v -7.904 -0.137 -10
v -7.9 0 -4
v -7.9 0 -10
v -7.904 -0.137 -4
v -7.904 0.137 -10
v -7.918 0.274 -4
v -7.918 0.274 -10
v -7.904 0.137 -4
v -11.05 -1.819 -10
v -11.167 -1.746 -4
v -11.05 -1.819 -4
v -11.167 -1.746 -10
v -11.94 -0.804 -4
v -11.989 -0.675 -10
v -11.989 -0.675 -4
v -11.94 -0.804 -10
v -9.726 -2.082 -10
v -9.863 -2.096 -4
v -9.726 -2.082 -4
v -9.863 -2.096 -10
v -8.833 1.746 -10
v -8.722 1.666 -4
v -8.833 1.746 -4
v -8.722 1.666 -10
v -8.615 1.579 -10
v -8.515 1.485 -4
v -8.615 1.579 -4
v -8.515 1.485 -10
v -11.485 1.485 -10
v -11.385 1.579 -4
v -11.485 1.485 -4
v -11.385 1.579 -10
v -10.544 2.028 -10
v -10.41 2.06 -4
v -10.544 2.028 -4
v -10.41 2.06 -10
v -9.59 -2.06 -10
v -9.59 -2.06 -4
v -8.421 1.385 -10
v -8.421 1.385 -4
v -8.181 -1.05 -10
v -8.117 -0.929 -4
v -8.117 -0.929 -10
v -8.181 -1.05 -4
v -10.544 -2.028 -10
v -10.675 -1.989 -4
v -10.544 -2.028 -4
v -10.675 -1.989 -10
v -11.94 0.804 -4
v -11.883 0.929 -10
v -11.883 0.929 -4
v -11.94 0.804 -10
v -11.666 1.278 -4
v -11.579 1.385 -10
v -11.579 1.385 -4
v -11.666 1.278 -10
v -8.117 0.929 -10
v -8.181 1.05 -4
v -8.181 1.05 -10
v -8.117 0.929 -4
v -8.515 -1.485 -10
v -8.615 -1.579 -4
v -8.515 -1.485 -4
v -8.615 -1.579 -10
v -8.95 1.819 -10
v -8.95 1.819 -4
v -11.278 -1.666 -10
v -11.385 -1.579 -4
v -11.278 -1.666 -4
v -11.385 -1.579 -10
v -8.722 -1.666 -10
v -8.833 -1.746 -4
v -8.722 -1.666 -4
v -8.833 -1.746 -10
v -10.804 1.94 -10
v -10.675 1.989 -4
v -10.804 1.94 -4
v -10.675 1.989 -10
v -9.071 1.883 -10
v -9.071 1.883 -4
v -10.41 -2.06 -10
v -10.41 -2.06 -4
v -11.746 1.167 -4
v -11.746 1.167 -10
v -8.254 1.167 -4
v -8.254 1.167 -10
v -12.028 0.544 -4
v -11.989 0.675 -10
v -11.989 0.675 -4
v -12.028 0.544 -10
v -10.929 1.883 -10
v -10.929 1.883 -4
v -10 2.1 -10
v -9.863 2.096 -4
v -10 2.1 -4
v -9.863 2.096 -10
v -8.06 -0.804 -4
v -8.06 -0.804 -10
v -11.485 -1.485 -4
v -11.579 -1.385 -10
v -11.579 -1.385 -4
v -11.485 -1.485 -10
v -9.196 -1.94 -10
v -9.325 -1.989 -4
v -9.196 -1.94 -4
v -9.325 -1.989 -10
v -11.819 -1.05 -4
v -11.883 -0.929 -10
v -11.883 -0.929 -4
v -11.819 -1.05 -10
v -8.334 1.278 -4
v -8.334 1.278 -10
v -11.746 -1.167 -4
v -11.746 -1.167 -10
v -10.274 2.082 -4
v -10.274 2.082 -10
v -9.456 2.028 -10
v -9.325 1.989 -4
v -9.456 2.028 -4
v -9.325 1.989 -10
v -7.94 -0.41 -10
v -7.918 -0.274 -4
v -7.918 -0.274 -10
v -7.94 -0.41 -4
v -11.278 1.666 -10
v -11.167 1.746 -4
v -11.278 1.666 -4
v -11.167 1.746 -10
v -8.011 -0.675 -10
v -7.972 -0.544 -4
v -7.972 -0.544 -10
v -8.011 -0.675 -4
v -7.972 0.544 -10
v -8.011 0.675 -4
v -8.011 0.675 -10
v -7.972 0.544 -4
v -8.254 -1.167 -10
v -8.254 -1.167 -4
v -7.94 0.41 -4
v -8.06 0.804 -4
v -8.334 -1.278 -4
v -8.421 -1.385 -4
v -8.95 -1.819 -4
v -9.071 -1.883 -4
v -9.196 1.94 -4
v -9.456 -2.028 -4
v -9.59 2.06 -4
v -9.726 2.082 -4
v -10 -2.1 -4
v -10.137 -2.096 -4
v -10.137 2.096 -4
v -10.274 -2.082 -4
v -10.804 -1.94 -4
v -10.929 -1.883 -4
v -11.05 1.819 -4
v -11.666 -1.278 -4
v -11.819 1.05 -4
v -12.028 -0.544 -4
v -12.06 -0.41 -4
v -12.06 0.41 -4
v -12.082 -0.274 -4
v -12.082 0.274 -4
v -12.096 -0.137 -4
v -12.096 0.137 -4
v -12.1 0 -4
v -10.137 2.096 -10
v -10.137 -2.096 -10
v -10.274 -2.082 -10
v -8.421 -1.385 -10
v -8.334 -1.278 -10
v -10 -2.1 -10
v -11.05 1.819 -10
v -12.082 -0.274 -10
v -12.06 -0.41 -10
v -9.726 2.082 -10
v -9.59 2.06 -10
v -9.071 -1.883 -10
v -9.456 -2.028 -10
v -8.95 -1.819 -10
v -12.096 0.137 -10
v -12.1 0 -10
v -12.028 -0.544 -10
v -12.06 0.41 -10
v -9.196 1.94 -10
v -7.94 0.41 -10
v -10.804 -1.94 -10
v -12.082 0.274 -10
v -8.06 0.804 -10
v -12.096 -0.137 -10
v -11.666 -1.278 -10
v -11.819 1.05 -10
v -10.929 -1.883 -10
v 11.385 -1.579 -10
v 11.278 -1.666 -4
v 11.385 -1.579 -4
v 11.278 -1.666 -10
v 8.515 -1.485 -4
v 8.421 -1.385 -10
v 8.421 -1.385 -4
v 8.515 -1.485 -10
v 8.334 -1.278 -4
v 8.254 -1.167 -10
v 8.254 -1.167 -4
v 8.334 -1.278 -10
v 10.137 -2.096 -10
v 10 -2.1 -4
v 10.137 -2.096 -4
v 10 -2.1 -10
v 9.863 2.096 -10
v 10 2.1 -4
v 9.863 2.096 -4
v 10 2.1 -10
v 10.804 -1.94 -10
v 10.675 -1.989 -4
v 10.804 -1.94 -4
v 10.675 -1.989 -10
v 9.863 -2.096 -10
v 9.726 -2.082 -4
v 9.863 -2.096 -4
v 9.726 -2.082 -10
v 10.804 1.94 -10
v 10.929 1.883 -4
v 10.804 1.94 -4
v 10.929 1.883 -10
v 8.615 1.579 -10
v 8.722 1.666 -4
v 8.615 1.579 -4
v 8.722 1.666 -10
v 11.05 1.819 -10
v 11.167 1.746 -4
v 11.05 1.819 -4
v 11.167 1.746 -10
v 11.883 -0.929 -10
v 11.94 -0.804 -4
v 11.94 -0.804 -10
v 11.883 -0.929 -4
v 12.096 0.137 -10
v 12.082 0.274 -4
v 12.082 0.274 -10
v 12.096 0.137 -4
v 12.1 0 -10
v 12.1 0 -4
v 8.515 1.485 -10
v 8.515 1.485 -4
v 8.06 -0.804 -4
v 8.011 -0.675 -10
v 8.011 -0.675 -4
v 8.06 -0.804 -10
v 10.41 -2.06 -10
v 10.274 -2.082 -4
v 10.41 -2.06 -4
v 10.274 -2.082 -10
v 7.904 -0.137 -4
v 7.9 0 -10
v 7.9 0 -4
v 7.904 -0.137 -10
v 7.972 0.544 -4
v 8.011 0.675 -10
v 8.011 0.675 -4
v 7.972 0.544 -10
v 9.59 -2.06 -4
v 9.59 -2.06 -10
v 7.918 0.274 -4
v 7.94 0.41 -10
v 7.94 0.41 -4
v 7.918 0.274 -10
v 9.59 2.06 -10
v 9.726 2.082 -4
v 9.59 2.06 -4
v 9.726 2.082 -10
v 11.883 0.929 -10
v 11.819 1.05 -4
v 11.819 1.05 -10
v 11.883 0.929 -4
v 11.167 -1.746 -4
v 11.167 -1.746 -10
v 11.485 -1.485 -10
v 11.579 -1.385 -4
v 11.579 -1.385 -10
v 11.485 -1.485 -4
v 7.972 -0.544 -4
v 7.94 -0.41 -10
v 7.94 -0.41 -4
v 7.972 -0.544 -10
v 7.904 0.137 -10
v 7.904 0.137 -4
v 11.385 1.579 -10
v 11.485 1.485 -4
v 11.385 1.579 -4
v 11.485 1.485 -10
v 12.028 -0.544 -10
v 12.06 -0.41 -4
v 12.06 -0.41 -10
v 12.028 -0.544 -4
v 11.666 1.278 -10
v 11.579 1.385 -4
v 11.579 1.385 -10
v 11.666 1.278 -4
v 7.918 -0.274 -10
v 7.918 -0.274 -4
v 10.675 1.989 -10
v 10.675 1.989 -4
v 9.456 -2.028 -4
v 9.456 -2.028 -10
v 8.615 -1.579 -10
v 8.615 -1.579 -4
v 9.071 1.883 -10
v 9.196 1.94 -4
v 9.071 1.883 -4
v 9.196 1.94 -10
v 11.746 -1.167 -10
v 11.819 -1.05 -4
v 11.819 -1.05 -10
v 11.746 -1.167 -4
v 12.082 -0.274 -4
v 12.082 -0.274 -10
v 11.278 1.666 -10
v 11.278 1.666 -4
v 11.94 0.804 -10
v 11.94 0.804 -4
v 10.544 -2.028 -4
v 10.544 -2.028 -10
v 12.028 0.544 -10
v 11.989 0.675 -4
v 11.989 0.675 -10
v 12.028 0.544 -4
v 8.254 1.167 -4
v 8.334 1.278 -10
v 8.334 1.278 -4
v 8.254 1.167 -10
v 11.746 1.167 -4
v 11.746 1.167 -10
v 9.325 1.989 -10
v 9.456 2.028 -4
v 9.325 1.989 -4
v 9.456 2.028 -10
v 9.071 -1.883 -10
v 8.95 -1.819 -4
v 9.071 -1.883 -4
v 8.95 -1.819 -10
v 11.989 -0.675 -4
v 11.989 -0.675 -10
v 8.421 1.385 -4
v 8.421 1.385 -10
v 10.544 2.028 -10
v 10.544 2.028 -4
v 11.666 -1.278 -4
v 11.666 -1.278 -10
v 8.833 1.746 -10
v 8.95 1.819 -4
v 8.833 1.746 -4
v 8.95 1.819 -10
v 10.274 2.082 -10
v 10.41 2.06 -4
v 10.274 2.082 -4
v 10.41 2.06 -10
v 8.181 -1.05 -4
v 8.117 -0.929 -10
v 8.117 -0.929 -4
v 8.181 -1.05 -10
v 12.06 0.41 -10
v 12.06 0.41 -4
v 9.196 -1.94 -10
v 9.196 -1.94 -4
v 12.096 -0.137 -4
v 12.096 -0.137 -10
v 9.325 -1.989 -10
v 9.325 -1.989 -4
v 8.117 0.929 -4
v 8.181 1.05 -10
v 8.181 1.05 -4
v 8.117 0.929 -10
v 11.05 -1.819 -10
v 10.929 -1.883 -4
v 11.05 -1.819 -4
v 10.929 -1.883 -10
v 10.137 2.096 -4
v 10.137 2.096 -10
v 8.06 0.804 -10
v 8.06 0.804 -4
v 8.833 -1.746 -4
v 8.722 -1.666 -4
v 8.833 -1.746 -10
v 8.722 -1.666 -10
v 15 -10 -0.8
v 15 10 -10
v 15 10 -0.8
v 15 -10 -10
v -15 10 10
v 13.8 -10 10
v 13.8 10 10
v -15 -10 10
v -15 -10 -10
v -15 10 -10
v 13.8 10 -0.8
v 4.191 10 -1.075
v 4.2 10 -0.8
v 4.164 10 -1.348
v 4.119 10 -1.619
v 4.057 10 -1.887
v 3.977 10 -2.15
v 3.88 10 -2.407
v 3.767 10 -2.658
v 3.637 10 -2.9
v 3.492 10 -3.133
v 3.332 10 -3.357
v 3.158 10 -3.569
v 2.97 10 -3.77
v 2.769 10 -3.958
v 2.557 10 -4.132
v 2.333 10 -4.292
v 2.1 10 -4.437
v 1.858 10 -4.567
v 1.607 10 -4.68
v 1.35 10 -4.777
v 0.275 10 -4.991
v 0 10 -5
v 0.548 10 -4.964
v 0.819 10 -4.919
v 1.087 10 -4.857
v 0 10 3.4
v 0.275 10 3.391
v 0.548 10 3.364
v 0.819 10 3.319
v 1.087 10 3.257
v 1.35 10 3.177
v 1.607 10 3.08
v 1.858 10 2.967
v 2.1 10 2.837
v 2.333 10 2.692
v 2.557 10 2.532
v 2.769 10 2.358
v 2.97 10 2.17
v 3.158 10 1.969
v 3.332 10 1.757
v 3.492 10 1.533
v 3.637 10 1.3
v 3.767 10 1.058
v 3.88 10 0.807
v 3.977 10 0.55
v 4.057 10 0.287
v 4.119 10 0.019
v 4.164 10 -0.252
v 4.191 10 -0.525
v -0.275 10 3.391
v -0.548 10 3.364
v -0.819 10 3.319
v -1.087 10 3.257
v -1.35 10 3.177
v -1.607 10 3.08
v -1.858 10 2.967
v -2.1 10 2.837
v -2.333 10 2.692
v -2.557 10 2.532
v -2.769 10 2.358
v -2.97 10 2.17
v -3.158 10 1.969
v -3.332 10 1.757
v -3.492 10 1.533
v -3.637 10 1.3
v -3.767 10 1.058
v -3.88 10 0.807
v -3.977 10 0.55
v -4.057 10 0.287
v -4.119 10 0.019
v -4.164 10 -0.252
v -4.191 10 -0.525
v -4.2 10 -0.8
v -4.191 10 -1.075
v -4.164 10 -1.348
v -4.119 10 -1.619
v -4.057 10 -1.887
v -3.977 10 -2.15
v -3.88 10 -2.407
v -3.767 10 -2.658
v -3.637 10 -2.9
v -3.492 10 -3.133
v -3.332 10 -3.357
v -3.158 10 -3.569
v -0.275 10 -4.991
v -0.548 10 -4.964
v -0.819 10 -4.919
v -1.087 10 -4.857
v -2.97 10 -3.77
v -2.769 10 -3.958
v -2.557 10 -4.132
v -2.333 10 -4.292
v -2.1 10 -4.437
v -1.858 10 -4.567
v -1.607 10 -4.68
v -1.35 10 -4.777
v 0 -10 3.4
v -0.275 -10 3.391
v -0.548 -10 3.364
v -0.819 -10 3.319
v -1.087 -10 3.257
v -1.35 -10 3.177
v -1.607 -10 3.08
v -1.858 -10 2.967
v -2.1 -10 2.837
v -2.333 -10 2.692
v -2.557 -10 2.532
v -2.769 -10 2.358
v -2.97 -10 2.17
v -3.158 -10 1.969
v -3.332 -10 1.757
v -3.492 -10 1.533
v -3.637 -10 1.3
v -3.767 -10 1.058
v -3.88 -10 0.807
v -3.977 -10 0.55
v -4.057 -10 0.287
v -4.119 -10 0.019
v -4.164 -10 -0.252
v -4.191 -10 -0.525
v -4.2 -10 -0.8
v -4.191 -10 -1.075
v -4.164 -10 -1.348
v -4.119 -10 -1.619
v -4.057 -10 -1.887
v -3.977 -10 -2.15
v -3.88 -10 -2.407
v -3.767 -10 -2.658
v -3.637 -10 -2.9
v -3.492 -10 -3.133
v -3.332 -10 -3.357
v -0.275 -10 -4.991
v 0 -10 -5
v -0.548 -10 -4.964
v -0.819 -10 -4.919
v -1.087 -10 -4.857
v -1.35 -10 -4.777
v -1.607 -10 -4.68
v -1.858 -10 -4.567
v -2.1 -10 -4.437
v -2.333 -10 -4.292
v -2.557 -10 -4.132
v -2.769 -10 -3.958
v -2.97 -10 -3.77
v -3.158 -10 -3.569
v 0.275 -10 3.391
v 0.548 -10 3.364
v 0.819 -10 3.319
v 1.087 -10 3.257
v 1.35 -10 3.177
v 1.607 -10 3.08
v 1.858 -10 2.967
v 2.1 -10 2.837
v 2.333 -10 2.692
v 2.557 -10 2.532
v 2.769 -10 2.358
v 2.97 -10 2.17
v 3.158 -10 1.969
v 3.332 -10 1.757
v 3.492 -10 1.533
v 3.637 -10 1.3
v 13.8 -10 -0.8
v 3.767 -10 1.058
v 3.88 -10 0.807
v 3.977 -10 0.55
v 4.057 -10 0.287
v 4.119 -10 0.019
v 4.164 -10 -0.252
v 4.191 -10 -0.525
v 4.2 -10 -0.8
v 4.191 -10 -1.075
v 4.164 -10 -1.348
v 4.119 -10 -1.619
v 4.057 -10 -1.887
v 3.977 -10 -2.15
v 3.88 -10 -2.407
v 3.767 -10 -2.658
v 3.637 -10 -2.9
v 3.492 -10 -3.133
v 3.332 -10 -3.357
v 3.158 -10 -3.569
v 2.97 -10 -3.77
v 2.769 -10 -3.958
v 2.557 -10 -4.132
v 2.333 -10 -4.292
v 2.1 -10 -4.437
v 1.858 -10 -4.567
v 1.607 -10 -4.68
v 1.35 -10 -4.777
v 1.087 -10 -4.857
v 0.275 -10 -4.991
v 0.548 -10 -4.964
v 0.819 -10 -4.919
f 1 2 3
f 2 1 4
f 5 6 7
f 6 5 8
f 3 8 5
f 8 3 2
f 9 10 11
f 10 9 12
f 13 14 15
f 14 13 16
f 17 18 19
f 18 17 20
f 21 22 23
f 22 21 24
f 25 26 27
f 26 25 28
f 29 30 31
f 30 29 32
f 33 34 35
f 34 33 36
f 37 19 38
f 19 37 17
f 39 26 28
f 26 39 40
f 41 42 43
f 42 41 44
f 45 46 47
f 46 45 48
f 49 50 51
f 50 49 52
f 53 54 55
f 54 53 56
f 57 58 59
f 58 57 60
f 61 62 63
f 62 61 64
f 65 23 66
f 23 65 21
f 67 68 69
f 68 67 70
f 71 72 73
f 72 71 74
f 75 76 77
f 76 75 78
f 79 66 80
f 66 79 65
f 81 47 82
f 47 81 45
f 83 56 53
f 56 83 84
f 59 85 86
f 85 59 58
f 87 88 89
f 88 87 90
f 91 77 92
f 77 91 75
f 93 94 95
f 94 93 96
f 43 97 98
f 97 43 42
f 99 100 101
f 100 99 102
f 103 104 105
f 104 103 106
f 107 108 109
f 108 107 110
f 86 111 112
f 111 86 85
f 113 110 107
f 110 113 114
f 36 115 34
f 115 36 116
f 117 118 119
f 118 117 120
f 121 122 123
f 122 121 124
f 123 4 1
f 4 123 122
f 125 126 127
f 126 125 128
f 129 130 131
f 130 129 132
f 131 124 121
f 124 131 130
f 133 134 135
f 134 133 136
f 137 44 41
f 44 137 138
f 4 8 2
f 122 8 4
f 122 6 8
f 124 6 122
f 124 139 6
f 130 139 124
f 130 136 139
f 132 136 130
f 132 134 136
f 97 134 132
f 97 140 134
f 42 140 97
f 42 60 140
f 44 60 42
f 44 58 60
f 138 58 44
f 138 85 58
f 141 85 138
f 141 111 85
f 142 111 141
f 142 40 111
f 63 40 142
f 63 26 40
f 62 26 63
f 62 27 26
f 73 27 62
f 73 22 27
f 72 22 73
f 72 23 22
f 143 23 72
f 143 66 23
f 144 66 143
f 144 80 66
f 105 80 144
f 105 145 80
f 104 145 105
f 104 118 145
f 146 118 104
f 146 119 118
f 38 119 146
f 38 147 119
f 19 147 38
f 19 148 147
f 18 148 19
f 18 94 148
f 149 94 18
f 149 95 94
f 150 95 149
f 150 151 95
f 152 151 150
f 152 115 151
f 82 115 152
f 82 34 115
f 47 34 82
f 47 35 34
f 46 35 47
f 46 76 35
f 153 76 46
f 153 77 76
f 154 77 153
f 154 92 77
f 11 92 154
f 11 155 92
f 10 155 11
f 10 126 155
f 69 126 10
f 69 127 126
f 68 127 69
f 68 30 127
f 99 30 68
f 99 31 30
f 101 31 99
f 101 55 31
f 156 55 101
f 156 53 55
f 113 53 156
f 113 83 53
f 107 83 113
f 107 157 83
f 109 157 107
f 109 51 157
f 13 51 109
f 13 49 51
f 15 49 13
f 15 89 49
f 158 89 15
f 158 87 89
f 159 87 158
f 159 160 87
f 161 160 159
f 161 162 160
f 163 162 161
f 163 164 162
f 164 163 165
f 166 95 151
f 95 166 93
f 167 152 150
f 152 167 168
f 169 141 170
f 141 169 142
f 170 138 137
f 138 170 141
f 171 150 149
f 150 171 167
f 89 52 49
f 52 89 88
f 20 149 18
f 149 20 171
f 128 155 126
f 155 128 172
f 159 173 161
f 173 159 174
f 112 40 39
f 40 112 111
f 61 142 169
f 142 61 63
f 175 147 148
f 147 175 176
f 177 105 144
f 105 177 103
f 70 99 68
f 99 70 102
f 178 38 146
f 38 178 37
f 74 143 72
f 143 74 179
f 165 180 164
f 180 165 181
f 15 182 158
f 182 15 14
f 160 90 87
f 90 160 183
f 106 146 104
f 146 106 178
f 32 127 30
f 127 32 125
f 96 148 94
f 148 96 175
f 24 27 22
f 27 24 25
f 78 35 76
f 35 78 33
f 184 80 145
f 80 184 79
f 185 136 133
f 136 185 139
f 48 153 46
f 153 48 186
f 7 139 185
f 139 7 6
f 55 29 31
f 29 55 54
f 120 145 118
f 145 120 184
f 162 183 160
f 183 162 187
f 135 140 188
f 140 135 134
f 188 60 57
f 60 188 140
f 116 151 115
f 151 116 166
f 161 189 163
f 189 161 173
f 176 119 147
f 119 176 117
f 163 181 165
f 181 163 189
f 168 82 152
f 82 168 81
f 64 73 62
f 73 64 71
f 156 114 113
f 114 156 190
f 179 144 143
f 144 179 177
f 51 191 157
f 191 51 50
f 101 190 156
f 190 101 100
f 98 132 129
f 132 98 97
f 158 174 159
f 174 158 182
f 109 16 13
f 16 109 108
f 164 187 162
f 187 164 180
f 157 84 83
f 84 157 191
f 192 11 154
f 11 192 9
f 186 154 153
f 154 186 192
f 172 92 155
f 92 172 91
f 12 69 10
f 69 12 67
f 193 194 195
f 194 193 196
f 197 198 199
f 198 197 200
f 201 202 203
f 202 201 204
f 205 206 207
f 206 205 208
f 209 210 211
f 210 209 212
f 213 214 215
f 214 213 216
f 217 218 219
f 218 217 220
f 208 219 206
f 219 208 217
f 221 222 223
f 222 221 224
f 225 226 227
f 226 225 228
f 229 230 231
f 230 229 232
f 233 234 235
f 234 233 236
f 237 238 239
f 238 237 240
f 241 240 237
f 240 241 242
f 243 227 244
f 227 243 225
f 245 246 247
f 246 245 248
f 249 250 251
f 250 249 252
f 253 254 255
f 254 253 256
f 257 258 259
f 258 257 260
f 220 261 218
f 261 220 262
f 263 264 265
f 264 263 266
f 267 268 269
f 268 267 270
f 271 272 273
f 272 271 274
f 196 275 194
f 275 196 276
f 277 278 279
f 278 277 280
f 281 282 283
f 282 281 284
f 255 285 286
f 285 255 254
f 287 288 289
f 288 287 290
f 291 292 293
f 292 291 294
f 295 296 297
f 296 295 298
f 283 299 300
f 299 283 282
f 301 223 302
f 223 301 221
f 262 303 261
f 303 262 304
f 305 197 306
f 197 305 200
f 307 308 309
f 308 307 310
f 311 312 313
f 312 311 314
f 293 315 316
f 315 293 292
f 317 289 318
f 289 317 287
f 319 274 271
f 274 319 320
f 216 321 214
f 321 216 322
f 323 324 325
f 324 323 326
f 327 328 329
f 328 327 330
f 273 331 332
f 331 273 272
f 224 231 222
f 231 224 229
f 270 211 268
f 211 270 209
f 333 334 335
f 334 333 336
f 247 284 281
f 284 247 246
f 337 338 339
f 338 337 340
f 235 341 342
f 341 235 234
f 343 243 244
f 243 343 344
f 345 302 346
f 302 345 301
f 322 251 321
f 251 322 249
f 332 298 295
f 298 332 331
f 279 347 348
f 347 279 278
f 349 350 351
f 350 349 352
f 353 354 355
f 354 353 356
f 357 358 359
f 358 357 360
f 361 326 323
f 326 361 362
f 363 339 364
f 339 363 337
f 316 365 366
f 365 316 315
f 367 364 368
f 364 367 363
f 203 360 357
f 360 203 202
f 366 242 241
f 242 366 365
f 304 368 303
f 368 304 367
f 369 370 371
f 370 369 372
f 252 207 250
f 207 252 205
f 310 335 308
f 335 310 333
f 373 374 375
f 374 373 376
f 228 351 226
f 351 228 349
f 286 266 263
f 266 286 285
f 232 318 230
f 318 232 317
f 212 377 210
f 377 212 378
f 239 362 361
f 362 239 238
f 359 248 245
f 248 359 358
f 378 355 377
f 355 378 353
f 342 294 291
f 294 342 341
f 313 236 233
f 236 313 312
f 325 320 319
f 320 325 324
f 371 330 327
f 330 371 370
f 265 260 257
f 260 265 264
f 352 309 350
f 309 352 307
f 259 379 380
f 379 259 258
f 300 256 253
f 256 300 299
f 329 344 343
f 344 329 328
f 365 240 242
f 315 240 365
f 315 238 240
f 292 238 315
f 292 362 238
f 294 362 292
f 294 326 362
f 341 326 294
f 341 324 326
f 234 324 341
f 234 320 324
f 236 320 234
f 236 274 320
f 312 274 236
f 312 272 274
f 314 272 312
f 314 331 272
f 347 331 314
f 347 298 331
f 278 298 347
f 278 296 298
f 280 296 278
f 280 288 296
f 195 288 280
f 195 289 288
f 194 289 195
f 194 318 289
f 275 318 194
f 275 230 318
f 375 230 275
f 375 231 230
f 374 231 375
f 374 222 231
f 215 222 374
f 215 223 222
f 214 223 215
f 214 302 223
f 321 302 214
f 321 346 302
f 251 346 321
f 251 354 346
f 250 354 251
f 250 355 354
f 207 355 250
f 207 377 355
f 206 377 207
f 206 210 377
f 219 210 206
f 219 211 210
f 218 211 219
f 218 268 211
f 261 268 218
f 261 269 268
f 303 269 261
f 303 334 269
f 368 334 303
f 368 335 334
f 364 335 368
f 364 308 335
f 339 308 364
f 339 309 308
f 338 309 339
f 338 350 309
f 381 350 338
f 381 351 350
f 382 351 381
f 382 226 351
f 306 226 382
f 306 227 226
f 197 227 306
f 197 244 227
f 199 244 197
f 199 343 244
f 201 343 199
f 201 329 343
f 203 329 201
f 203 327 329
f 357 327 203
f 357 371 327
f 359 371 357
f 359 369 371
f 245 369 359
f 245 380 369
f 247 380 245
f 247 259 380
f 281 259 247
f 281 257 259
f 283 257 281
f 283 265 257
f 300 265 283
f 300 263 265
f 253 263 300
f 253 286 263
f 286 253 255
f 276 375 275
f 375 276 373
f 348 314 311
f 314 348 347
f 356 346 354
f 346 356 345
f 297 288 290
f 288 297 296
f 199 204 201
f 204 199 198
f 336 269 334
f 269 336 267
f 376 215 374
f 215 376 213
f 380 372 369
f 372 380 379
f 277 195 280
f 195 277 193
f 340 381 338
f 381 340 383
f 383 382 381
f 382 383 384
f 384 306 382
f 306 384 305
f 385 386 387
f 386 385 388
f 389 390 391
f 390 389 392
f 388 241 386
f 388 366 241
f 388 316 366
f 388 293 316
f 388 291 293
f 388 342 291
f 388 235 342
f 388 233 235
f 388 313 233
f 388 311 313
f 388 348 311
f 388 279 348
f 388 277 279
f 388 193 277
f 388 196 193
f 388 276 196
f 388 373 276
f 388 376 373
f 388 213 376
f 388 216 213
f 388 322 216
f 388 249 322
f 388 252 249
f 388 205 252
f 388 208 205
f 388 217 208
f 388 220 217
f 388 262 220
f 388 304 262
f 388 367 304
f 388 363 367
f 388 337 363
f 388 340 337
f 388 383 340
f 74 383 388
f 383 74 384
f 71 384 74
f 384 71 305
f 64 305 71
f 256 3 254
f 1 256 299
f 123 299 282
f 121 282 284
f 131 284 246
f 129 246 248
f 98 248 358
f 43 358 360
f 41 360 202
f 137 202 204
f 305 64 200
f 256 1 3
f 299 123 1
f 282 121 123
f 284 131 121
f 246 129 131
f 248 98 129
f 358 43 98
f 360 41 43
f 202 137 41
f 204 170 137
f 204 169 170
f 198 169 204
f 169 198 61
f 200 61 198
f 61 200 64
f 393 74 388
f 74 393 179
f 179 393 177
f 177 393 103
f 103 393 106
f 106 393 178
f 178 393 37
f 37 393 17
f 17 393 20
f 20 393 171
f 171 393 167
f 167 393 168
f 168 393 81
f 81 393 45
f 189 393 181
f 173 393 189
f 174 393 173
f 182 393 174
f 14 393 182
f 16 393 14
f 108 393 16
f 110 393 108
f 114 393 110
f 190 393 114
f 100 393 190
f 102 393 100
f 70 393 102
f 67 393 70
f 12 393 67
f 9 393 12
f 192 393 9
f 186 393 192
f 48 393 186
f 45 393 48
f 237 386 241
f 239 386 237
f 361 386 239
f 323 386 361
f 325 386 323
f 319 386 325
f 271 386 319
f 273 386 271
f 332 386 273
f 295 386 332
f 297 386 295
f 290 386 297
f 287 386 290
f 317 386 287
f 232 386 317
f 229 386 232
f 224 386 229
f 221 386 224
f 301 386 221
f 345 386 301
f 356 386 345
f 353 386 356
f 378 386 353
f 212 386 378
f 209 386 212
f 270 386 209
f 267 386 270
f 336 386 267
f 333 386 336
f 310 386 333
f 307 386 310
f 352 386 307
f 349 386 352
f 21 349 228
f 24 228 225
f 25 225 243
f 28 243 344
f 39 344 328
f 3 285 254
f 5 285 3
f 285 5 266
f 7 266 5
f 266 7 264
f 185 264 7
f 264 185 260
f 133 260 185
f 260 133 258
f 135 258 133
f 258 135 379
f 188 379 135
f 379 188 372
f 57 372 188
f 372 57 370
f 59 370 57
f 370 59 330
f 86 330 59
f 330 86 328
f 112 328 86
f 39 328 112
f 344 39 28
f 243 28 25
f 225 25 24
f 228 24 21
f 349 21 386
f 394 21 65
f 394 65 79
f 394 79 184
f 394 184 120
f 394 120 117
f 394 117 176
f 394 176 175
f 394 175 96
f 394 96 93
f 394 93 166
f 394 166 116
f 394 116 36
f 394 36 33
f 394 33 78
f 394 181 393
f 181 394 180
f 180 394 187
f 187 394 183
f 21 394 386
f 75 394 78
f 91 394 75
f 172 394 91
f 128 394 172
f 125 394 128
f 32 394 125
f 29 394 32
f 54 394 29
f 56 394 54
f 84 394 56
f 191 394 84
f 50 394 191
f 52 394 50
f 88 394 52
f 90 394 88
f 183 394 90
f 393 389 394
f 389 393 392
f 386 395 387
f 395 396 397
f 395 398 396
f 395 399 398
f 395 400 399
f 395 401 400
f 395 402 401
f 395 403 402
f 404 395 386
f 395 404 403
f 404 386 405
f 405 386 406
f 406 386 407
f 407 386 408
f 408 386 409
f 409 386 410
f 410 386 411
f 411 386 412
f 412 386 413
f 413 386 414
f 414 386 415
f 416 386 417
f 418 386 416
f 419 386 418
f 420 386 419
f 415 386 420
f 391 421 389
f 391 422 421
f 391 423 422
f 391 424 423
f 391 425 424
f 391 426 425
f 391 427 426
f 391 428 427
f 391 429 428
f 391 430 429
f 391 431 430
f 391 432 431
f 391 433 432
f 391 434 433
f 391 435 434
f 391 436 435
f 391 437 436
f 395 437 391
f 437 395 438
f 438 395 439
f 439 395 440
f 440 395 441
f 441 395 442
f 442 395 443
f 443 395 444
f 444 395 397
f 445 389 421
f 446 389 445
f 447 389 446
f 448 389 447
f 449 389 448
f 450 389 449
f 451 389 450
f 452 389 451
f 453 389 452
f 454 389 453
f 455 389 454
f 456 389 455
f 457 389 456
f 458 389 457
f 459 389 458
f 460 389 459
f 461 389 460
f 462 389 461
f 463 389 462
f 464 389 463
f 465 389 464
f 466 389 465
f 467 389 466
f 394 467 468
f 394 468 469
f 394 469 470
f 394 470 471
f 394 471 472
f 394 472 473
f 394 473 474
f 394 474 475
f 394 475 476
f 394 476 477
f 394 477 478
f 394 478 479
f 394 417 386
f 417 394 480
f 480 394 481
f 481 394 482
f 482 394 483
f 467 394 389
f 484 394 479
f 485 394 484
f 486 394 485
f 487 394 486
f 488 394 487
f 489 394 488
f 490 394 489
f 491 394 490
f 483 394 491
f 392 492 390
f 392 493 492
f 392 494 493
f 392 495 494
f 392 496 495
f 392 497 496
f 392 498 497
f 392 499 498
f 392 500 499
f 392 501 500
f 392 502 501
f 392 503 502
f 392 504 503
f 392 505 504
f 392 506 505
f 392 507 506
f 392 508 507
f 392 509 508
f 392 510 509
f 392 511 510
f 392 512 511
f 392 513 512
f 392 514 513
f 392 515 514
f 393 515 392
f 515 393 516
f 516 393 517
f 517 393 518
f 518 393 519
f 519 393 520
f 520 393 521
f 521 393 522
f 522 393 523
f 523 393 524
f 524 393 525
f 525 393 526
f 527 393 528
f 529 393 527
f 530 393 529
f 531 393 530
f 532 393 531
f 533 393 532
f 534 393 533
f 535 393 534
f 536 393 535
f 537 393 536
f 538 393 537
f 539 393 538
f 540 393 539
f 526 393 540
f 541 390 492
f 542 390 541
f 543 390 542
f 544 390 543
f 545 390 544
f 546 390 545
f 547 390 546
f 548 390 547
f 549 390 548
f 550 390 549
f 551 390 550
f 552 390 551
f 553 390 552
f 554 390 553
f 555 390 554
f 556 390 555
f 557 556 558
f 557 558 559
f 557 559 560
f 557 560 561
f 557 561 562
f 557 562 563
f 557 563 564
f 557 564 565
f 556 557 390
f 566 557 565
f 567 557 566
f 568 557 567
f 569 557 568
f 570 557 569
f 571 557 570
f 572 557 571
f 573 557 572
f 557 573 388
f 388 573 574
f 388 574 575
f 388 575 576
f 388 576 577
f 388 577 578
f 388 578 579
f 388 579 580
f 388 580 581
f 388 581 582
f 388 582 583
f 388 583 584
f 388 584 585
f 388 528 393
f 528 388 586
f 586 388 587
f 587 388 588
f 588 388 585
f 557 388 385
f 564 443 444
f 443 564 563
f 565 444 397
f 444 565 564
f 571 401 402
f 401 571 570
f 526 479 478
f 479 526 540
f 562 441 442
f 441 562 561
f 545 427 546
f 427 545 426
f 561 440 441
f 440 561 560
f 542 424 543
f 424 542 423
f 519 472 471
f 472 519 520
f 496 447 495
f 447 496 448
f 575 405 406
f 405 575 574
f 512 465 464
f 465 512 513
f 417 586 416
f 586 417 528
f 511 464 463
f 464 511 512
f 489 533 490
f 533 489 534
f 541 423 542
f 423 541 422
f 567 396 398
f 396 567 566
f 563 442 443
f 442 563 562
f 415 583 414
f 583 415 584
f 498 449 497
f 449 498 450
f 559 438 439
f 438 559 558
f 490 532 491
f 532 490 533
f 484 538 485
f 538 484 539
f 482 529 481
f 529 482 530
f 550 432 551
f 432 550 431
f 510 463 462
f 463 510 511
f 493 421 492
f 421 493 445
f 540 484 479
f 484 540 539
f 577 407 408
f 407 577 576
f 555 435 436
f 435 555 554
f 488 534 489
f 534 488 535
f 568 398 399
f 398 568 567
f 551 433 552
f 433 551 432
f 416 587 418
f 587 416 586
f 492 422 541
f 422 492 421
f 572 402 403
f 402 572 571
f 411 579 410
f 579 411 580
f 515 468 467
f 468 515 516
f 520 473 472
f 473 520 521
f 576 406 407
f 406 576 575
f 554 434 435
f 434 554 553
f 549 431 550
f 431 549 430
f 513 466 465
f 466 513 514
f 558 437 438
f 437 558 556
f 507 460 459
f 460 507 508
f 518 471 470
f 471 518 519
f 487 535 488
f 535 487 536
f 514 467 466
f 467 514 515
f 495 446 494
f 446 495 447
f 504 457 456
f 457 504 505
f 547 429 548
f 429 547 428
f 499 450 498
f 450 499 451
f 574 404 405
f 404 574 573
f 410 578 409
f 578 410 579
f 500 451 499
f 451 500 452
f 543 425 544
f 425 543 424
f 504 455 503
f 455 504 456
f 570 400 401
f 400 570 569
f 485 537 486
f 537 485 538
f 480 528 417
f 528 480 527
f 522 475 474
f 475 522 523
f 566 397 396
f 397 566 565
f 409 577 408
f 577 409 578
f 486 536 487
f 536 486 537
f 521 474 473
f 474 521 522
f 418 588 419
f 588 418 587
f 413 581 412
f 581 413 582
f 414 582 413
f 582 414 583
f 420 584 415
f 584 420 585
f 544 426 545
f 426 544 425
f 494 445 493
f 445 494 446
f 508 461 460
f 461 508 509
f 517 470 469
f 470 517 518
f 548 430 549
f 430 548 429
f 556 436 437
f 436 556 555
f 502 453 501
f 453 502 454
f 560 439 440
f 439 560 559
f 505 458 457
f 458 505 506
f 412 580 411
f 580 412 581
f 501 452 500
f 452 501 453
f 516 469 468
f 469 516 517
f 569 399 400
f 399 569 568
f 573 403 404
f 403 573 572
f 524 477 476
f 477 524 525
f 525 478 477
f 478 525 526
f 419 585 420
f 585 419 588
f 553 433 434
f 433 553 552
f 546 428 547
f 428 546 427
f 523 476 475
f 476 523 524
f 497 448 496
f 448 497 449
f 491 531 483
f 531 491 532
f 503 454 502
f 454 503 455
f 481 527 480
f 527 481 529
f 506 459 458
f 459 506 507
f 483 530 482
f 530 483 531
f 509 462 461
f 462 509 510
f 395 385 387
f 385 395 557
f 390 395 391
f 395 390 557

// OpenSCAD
// Shaft support bracket for 8.0mm rod, 20.0mm tall
// Connectivity-fixed: single continuous solid, no floating halves, no center split

// Parameters
rod_diameter = 8.0; //[4.0:16.0:0.1]
bracket_height = 20.0; //[10.0:40.0:0.5]
bracket_width  = 30.0; //[15.0:60.0:0.5]
bracket_depth  = 20.0; //[10.0:50.0:0.5]

base_thickness = 5.0;  //[2.5:12.0:0.5]
wall_thickness = 4.0;  //[2.0:10.0:0.5]
rod_clearance  = 0.2;  //[0.0:0.6:0.05]

mount_hole_count = 2; //[1:4:1]
mount_hole_diameter = 4.2; //[2.0:8.0:0.1]
mount_hole_spacing  = 20.0; //[10.0:50.0:0.5]
mount_hole_edge_margin = 5.0; //[2.0:15.0:0.5]

clamp_split = 1; //[0:1:1]
clamp_split_slot_width = 1.2; //[0.6:3.0:0.1]

overlap = 1.0; //[0.5:2.0:0.1]
$fn = 96;

module bracket() {
  rod_r = (rod_diameter + 2*rod_clearance)/2;

  // Rod axis positioned to keep bottom wall = base_thickness and top wall = wall_thickness
  rod_axis_z = -bracket_height/2 + base_thickness + rod_r;

  // Slot should NOT split the part into left/right halves.
  // Ensure a solid "spine" remains by limiting slot depth in X.
  // Keep at least 2mm of material at the far side of the slot.
  min_spine = 2.0;
  slot_x = min(clamp_split_slot_width, max(0.2, bracket_width - min_spine));

  // Slot runs along depth (Y), from top surface down to (just past) rod axis.
  slot_h = (bracket_height/2 - rod_axis_z) + overlap;
  slot_z = rod_axis_z + slot_h/2;

  // Place slot so it opens from ONE outer face only (prevents center split).
  // Start at +X face and cut inward by slot_x, with slight overlap into the body.
  slot_center_x = bracket_width/2 - slot_x/2 + overlap;

  union() {
    difference() {
      // Main body (single solid)
      cube([bracket_width, bracket_depth, bracket_height], center=true);

      // Rod bore (through depth)
      translate([0, 0, rod_axis_z])
        rotate([90, 0, 0])
          cylinder(r=rod_r, h=bracket_depth + 2*overlap, center=true);

      // Clamp split slot: from +X outside face inward, down from top to bore axis region
      if (clamp_split)
        translate([slot_center_x, 0, slot_z])
          cube([slot_x + 2*overlap, bracket_depth + 2*overlap, slot_h], center=true);

      // Mounting holes through base thickness only (along Z)
      hole_z = -bracket_height/2 + base_thickness/2;

      if (mount_hole_count <= 1) {
        translate([0, 0, hole_z])
          cylinder(r=mount_hole_diameter/2, h=base_thickness + 2*overlap, center=true);
      } else if (mount_hole_count == 2) {
        for (x = [-mount_hole_spacing/2, mount_hole_spacing/2])
          translate([x, 0, hole_z])
            cylinder(r=mount_hole_diameter/2, h=base_thickness + 2*overlap, center=true);
      } else {
        usable_w = bracket_width - 2*mount_hole_edge_margin;
        step = (mount_hole_count > 1) ? (usable_w/(mount_hole_count-1)) : 0;
        for (i = [0:mount_hole_count-1]) {
          x = -usable_w/2 + i*step;
          translate([x, 0, hole_z])
            cylinder(r=mount_hole_diameter/2, h=base_thickness + 2*overlap, center=true);
        }
      }
    }
  }
}

bracket();
